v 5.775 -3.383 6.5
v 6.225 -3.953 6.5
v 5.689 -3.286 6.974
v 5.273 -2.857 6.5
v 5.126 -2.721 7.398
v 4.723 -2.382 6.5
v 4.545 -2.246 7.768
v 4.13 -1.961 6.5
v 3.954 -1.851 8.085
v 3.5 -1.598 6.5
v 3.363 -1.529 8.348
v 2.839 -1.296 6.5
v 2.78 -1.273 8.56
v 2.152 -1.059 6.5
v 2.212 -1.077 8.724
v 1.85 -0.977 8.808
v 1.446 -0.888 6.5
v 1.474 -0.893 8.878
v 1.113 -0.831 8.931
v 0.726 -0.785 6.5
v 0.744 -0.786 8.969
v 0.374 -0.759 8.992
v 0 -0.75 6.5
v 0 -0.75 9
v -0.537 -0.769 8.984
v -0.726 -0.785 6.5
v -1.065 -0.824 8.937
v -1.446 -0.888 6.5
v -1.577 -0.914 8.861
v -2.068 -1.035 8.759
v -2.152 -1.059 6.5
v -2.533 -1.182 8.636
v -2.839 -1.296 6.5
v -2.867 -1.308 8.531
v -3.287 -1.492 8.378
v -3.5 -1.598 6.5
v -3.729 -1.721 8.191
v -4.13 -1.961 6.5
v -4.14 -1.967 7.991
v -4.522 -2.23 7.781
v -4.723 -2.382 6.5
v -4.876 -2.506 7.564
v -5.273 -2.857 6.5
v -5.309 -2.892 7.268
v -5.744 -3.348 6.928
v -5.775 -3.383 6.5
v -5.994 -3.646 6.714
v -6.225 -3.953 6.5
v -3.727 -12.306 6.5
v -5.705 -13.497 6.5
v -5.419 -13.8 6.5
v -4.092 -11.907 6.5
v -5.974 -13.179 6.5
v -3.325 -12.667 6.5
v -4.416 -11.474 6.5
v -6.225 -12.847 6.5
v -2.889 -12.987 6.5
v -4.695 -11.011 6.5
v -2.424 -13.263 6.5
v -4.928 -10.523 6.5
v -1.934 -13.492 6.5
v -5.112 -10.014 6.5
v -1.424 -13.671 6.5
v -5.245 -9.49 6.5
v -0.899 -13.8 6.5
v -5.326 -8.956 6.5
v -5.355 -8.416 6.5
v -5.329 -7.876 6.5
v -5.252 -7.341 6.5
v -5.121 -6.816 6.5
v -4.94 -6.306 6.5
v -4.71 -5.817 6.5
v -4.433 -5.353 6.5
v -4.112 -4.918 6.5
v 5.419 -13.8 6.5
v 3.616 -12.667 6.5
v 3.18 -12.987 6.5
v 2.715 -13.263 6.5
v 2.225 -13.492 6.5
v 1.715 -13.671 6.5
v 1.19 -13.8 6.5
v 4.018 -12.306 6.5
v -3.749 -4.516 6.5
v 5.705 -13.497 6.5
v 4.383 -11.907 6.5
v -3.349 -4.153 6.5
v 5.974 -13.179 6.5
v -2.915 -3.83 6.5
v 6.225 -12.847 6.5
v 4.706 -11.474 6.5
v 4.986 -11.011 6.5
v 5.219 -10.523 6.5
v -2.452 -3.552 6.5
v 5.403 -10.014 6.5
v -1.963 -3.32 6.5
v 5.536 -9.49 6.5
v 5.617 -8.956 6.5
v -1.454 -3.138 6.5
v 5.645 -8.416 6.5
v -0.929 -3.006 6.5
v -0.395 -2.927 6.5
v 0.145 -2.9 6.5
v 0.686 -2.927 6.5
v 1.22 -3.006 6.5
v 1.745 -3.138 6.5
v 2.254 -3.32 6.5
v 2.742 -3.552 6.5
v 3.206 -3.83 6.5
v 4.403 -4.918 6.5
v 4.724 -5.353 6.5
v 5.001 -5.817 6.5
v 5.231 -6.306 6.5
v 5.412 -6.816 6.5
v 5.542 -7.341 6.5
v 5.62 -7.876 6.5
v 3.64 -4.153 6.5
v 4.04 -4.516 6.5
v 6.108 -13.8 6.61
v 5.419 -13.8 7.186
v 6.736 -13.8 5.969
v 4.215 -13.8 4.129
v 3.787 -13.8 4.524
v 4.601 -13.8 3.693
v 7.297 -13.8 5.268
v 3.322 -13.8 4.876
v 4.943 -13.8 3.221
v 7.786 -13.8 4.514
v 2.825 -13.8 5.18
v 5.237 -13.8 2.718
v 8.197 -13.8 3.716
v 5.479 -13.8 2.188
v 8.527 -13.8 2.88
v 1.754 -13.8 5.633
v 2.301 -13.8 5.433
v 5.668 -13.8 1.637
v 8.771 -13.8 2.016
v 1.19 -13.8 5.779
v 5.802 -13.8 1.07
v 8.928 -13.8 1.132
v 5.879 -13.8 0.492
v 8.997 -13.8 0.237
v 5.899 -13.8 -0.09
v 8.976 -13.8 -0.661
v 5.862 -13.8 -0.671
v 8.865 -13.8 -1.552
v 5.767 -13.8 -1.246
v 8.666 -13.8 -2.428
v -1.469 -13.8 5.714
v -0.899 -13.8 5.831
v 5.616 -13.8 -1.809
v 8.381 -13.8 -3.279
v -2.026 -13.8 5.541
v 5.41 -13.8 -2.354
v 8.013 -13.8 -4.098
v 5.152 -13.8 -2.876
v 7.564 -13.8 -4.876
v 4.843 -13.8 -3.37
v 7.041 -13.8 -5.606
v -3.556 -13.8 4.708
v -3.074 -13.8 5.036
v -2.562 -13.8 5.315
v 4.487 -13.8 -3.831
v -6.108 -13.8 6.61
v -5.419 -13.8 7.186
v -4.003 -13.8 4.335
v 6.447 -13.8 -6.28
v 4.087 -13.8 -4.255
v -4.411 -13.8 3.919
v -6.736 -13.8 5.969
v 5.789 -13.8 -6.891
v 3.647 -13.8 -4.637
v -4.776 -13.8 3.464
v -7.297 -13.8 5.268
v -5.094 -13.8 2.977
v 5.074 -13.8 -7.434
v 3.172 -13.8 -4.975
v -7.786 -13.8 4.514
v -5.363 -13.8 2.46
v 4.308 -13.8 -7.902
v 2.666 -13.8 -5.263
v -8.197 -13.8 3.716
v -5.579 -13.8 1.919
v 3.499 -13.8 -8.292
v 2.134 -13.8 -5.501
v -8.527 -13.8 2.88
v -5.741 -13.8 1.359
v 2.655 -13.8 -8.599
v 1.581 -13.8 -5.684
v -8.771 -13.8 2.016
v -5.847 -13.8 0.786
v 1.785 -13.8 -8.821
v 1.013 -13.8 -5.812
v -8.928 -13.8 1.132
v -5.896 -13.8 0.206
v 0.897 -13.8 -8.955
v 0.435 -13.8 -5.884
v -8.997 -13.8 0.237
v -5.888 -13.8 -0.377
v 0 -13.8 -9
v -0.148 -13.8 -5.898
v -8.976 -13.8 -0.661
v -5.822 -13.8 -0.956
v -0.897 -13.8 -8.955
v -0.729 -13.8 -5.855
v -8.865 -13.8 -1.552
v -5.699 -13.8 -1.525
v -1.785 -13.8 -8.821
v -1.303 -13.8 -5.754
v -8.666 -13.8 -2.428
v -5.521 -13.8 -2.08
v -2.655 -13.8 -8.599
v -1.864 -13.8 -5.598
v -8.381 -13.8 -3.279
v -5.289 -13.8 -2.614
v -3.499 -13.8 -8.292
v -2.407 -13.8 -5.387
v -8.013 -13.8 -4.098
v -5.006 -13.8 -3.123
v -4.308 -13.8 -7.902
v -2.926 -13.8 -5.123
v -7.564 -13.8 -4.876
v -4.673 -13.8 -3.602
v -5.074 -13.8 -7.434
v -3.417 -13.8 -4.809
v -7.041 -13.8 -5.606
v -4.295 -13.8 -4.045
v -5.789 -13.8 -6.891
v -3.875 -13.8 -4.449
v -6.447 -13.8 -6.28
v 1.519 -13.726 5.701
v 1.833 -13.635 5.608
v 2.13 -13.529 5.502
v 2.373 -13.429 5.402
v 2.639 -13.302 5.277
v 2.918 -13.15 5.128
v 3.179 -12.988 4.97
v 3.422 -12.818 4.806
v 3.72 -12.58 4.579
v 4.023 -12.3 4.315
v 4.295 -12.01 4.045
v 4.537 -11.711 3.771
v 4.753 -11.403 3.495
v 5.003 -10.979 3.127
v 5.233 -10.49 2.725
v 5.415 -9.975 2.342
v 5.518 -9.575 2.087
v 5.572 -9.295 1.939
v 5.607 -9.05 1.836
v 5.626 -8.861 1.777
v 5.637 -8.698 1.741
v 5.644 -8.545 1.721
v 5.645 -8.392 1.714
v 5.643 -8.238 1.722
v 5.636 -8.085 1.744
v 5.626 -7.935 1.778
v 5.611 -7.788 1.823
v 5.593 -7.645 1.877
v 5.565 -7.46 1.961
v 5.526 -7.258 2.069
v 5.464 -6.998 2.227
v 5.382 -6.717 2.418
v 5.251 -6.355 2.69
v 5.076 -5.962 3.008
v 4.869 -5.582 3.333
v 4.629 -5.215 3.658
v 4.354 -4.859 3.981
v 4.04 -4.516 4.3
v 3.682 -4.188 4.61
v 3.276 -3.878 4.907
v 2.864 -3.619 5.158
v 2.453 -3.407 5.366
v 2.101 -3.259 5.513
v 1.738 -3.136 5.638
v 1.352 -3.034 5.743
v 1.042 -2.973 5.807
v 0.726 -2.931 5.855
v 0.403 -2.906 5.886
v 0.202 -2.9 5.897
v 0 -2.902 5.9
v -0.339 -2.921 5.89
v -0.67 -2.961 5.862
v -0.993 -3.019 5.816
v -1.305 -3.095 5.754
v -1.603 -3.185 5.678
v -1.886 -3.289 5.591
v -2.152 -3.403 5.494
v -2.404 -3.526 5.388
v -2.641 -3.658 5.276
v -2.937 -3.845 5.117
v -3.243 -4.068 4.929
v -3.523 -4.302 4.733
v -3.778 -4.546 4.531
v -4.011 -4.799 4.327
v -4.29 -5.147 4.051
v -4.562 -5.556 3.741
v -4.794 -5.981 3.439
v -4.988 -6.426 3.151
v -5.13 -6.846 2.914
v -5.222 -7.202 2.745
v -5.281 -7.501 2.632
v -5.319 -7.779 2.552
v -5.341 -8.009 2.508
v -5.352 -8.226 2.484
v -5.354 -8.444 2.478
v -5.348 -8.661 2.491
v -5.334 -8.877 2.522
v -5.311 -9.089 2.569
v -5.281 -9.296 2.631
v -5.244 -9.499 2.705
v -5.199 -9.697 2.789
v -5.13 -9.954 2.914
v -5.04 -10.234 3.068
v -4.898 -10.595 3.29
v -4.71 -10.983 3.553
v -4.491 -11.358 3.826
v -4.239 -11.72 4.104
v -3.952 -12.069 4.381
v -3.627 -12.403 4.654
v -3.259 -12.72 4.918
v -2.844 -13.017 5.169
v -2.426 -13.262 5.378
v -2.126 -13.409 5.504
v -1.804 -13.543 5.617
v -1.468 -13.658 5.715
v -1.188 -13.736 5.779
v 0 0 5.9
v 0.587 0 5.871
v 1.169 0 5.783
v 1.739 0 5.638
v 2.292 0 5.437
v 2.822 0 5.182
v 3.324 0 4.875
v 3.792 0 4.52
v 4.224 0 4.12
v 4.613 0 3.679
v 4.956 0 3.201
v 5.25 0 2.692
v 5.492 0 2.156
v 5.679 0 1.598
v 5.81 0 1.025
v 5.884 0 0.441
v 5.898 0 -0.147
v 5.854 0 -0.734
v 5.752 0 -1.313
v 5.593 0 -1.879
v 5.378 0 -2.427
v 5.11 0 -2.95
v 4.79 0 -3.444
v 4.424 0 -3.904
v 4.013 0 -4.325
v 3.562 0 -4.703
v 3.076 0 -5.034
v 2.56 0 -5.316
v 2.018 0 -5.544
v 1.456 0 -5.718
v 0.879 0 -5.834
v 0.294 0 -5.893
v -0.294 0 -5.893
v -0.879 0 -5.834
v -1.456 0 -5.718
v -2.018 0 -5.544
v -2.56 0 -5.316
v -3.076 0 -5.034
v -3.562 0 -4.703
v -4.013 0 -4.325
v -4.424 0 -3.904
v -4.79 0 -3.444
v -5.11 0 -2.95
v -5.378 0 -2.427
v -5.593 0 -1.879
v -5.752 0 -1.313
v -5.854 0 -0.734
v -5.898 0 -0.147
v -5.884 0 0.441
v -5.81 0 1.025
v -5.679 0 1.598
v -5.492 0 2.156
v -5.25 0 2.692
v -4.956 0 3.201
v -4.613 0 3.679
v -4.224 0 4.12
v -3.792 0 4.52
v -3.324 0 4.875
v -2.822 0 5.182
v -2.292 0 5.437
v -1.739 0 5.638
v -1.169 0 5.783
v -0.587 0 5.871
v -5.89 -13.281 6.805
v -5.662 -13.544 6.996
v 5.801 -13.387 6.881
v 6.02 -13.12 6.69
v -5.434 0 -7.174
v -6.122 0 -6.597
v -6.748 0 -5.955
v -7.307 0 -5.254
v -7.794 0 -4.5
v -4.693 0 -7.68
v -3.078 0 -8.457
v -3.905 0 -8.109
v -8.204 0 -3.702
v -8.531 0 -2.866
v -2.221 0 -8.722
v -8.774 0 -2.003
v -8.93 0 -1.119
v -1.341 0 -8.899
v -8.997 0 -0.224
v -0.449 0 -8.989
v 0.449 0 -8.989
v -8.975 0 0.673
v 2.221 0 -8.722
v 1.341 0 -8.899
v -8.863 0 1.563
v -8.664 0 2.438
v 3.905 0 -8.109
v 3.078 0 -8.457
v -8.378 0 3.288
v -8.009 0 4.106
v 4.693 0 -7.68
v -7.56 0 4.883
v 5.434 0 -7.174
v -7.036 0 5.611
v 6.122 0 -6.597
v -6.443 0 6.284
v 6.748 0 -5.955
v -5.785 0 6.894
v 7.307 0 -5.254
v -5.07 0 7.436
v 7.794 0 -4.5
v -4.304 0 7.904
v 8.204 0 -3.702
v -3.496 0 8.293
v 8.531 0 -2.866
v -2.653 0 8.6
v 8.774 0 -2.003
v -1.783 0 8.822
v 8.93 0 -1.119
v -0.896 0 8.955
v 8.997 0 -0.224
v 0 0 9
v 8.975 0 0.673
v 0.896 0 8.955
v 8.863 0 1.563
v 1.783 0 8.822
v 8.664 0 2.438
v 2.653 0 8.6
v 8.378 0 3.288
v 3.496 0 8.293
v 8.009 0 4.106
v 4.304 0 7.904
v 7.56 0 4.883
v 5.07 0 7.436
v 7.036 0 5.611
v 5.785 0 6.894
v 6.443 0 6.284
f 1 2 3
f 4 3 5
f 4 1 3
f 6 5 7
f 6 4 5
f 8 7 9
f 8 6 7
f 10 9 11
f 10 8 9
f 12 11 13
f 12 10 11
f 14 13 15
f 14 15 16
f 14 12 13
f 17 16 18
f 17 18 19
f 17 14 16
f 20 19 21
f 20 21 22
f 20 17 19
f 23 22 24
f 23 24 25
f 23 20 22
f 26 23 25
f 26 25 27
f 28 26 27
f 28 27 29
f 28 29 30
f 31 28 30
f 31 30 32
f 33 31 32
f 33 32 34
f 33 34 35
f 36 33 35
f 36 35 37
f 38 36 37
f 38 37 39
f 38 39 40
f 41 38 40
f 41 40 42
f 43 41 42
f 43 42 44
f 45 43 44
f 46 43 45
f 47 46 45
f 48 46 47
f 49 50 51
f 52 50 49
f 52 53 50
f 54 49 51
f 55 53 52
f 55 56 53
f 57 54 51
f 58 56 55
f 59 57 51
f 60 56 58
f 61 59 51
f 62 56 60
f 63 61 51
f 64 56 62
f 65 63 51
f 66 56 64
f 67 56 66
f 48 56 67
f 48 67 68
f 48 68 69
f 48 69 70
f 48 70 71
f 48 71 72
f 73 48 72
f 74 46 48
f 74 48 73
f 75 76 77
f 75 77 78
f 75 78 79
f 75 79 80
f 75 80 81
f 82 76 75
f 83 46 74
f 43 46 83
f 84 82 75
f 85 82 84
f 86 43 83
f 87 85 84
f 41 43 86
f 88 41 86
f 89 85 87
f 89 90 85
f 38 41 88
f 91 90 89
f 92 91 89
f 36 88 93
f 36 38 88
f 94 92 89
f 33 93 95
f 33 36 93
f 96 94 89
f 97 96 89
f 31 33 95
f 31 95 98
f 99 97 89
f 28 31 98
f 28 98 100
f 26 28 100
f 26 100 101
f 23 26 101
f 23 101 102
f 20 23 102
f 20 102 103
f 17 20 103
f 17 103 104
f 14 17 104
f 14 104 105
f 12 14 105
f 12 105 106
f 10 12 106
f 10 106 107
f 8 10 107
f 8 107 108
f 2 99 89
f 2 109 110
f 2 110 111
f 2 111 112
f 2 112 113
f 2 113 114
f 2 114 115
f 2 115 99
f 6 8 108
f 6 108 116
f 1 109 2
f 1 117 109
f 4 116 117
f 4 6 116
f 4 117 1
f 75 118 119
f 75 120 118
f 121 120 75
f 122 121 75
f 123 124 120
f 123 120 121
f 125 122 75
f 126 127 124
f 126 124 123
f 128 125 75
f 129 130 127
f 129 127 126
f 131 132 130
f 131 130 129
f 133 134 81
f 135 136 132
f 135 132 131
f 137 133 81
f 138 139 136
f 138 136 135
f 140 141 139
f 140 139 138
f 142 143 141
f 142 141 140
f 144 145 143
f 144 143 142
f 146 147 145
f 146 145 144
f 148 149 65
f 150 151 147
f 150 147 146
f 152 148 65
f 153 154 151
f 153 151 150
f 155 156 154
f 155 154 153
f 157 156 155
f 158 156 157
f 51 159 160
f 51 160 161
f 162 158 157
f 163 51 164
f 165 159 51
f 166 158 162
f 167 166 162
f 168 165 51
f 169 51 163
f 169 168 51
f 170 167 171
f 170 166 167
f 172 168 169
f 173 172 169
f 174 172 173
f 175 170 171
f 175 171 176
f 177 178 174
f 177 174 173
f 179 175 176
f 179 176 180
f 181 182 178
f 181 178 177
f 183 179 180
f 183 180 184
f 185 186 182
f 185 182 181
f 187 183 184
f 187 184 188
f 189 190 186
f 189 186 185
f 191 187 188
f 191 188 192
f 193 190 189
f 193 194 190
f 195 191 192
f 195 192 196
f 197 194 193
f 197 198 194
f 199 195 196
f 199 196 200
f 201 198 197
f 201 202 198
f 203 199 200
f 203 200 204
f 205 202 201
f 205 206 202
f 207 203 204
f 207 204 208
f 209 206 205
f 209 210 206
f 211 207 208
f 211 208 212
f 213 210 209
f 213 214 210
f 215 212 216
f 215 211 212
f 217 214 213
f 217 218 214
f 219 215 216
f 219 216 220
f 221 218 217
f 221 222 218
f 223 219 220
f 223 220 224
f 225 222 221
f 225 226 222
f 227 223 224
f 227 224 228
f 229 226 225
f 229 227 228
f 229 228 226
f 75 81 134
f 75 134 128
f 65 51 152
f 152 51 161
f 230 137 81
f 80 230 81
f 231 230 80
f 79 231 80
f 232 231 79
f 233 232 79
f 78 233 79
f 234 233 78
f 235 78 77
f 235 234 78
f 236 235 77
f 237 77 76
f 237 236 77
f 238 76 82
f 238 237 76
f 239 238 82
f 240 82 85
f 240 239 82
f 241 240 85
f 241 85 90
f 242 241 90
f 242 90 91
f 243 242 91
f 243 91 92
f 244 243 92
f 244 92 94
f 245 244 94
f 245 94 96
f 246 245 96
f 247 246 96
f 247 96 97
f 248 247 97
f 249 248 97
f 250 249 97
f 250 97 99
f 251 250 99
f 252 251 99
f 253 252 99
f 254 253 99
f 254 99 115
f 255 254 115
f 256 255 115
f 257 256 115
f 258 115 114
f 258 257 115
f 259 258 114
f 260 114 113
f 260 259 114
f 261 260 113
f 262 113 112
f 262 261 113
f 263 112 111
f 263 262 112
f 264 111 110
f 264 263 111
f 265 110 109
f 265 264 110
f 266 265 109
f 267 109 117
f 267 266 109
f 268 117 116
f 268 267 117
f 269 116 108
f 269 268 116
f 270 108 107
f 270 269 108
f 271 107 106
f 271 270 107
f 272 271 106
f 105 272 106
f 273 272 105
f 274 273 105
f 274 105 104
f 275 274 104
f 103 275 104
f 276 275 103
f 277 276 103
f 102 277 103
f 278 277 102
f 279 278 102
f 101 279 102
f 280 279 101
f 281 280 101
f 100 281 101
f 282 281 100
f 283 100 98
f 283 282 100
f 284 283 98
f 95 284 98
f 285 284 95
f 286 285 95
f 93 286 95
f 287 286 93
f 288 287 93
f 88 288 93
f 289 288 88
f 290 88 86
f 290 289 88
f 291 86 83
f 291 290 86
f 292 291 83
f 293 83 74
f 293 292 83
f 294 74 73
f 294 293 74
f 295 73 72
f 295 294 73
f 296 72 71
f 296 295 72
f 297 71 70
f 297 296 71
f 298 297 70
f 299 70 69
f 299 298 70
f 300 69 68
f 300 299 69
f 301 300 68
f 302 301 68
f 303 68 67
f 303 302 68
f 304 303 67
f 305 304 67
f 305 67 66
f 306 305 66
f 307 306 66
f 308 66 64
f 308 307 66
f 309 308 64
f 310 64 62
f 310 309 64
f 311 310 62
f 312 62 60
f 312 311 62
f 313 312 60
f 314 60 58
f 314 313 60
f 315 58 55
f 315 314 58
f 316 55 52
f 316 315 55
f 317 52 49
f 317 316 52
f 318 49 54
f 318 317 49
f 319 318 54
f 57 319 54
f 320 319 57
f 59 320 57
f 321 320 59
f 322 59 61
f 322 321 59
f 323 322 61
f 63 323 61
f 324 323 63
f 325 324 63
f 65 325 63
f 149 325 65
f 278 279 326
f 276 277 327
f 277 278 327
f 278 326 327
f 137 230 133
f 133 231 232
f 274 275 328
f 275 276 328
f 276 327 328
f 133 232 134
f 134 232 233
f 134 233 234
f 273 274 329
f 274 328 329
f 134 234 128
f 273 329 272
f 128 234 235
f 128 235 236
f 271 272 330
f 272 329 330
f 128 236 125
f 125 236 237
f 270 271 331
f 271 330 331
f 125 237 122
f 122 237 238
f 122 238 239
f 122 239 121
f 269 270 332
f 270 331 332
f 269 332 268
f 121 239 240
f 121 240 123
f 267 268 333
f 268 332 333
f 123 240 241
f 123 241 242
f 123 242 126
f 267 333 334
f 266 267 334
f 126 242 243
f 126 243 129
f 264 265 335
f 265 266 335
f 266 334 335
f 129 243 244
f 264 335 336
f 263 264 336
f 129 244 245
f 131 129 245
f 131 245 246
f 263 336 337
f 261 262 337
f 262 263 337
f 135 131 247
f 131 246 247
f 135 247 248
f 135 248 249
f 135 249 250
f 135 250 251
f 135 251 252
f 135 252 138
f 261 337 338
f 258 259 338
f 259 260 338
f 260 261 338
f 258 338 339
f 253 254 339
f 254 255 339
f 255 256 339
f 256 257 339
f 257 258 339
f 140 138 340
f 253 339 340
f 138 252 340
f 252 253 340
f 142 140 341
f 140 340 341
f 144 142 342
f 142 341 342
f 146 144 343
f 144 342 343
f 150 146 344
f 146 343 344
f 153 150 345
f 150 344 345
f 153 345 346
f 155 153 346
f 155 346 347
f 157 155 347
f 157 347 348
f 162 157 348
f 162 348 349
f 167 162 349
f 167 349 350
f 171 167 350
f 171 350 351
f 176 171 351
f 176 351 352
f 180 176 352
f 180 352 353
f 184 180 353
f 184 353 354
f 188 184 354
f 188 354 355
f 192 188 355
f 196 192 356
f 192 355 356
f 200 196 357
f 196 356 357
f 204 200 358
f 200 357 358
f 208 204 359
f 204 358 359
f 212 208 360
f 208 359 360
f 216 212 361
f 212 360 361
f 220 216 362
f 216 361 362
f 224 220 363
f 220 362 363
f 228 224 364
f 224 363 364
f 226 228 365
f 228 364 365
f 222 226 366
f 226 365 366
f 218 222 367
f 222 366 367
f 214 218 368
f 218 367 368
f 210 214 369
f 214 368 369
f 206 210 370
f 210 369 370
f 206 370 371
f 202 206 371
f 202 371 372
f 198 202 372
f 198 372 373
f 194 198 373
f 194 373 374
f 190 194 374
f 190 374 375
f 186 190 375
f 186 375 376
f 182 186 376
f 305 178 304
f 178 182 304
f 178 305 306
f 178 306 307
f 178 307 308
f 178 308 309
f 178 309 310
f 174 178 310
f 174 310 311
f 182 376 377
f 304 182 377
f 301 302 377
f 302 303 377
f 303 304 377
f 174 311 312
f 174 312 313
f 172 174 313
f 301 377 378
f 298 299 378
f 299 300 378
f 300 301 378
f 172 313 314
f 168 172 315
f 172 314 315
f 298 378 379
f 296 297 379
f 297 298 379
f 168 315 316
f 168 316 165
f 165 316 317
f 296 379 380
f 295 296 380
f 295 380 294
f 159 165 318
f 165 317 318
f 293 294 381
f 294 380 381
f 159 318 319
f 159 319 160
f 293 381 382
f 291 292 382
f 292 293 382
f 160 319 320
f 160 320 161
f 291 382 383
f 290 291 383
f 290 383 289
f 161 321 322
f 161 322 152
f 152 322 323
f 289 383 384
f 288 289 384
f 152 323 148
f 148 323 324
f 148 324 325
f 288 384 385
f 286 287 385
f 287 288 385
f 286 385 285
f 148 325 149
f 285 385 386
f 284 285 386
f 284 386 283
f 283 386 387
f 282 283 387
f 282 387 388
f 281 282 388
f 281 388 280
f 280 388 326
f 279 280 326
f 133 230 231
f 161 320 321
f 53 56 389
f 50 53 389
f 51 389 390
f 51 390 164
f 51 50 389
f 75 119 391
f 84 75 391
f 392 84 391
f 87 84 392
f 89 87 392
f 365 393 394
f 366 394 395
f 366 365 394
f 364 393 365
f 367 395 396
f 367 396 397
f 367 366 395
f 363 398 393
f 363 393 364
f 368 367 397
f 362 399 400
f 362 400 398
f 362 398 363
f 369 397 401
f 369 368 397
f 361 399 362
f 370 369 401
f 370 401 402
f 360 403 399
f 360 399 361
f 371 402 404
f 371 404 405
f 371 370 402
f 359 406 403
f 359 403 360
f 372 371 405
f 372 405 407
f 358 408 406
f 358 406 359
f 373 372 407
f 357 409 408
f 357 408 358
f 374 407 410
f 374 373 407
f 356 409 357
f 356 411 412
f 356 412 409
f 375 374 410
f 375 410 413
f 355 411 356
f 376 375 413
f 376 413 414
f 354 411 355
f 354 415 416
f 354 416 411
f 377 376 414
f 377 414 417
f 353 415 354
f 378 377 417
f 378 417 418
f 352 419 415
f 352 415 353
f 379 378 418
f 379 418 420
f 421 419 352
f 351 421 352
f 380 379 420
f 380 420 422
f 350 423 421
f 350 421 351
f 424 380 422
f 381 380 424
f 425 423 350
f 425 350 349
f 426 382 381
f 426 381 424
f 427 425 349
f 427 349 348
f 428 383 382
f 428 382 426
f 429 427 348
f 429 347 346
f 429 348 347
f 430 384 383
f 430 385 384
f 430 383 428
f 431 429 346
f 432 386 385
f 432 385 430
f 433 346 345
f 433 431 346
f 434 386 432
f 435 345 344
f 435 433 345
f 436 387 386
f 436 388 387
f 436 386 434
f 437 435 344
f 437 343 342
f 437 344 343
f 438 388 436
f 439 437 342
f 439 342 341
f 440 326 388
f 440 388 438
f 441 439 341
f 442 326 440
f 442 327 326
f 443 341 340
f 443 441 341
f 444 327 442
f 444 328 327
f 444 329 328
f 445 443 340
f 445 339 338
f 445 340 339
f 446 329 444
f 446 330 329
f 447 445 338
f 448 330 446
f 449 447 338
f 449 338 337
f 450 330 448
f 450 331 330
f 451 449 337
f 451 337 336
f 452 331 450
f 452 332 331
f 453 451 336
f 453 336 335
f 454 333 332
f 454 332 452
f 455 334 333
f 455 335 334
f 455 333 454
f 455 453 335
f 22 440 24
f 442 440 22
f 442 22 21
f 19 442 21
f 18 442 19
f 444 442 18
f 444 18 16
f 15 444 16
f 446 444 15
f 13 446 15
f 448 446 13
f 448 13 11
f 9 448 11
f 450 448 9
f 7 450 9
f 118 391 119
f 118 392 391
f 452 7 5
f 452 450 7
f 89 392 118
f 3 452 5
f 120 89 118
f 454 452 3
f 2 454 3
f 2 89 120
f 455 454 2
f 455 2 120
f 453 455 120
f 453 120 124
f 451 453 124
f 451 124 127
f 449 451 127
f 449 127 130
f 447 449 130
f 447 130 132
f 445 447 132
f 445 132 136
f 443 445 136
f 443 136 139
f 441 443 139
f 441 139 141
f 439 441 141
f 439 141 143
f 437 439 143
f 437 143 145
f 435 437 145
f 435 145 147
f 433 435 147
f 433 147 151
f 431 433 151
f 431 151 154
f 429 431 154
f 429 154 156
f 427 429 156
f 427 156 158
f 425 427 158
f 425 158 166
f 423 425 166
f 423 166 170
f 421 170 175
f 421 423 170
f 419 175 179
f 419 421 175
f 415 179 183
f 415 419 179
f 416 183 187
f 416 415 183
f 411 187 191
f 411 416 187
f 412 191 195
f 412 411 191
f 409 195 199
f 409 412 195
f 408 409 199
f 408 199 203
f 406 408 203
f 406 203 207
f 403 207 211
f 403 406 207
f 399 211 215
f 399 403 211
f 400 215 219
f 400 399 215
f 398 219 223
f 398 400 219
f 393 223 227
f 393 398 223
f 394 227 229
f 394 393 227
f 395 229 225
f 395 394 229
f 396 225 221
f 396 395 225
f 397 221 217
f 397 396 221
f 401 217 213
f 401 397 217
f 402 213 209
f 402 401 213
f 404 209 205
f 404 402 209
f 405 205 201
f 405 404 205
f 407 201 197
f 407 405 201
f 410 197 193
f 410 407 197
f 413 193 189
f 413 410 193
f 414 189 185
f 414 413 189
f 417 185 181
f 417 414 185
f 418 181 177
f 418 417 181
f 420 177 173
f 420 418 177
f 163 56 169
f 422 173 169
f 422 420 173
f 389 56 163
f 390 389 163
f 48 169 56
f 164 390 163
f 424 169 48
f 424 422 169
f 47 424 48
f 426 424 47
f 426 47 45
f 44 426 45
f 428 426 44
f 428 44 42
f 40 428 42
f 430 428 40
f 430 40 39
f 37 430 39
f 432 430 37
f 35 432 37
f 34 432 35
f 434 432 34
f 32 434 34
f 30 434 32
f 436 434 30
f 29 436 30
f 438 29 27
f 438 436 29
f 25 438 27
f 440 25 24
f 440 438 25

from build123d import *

# Parameters (mm, degrees)
SKETCH1_R               = 9
SKETCH1_R_2             = 5.9
BOSS_EXTRUDE1_DEPTH     = 19.8
CUT_EXTRUDE5_START      = 6.5
SKETCH3_R               = 7.65
CUT_EXTRUDE5_DEPTH      = 18.038054295
CUT_EXTRUDE6_DEPTH      = 27.707489752
CUT_EXTRUDE6_DEPTH_BACK = 7
SKETCH6_R               = 5.5
SKETCH7_R               = 12.932797278
CUT_EXTRUDE7_DEPTH      = 10


with BuildPart() as part:
    # Sketch1 → Boss-Extrude1 (new body)
    with BuildSketch(Plane(origin=(0, 0, 0), x_dir=(1, 0, 0), z_dir=(0, 1, 0))):
        with Locations(Location((0, 0, 0), (0, 0, 270))):
            Circle(SKETCH1_R)
        with Locations(Location((0, 0, 0), (0, 0, 270))):
            Circle(SKETCH1_R_2, mode=Mode.SUBTRACT)
    extrude(amount=-BOSS_EXTRUDE1_DEPTH)

    # Sketch3 → Cut-Extrude5 (cut, through all)
    with BuildSketch(Plane.XY.offset(CUT_EXTRUDE5_START)):
        with Locations((0, -8.4)):
            Circle(SKETCH3_R)
    extrude(amount=CUT_EXTRUDE5_DEPTH, mode=Mode.SUBTRACT)

    # Sketch6 → Cut-Extrude6 (cut, two sides: drawn at the far end of the back side and taken through both)
    with BuildSketch(Plane.XY.offset(6.5).offset(-CUT_EXTRUDE6_DEPTH_BACK)):
        with Locations(Location((0.145476138, -8.4, 0), (0, 0, 91.515662264))):
            Circle(SKETCH6_R)
    extrude(amount=CUT_EXTRUDE6_DEPTH + CUT_EXTRUDE6_DEPTH_BACK, mode=Mode.SUBTRACT)

    # Sketch7 → Cut-Extrude7 (cut)
    with BuildSketch(Plane(origin=(0, -13.8, 0), x_dir=(-1, 0, 0), z_dir=(0, -1, 0))):
        Circle(SKETCH7_R)
    extrude(amount=CUT_EXTRUDE7_DEPTH, mode=Mode.SUBTRACT)


solid = part.part
